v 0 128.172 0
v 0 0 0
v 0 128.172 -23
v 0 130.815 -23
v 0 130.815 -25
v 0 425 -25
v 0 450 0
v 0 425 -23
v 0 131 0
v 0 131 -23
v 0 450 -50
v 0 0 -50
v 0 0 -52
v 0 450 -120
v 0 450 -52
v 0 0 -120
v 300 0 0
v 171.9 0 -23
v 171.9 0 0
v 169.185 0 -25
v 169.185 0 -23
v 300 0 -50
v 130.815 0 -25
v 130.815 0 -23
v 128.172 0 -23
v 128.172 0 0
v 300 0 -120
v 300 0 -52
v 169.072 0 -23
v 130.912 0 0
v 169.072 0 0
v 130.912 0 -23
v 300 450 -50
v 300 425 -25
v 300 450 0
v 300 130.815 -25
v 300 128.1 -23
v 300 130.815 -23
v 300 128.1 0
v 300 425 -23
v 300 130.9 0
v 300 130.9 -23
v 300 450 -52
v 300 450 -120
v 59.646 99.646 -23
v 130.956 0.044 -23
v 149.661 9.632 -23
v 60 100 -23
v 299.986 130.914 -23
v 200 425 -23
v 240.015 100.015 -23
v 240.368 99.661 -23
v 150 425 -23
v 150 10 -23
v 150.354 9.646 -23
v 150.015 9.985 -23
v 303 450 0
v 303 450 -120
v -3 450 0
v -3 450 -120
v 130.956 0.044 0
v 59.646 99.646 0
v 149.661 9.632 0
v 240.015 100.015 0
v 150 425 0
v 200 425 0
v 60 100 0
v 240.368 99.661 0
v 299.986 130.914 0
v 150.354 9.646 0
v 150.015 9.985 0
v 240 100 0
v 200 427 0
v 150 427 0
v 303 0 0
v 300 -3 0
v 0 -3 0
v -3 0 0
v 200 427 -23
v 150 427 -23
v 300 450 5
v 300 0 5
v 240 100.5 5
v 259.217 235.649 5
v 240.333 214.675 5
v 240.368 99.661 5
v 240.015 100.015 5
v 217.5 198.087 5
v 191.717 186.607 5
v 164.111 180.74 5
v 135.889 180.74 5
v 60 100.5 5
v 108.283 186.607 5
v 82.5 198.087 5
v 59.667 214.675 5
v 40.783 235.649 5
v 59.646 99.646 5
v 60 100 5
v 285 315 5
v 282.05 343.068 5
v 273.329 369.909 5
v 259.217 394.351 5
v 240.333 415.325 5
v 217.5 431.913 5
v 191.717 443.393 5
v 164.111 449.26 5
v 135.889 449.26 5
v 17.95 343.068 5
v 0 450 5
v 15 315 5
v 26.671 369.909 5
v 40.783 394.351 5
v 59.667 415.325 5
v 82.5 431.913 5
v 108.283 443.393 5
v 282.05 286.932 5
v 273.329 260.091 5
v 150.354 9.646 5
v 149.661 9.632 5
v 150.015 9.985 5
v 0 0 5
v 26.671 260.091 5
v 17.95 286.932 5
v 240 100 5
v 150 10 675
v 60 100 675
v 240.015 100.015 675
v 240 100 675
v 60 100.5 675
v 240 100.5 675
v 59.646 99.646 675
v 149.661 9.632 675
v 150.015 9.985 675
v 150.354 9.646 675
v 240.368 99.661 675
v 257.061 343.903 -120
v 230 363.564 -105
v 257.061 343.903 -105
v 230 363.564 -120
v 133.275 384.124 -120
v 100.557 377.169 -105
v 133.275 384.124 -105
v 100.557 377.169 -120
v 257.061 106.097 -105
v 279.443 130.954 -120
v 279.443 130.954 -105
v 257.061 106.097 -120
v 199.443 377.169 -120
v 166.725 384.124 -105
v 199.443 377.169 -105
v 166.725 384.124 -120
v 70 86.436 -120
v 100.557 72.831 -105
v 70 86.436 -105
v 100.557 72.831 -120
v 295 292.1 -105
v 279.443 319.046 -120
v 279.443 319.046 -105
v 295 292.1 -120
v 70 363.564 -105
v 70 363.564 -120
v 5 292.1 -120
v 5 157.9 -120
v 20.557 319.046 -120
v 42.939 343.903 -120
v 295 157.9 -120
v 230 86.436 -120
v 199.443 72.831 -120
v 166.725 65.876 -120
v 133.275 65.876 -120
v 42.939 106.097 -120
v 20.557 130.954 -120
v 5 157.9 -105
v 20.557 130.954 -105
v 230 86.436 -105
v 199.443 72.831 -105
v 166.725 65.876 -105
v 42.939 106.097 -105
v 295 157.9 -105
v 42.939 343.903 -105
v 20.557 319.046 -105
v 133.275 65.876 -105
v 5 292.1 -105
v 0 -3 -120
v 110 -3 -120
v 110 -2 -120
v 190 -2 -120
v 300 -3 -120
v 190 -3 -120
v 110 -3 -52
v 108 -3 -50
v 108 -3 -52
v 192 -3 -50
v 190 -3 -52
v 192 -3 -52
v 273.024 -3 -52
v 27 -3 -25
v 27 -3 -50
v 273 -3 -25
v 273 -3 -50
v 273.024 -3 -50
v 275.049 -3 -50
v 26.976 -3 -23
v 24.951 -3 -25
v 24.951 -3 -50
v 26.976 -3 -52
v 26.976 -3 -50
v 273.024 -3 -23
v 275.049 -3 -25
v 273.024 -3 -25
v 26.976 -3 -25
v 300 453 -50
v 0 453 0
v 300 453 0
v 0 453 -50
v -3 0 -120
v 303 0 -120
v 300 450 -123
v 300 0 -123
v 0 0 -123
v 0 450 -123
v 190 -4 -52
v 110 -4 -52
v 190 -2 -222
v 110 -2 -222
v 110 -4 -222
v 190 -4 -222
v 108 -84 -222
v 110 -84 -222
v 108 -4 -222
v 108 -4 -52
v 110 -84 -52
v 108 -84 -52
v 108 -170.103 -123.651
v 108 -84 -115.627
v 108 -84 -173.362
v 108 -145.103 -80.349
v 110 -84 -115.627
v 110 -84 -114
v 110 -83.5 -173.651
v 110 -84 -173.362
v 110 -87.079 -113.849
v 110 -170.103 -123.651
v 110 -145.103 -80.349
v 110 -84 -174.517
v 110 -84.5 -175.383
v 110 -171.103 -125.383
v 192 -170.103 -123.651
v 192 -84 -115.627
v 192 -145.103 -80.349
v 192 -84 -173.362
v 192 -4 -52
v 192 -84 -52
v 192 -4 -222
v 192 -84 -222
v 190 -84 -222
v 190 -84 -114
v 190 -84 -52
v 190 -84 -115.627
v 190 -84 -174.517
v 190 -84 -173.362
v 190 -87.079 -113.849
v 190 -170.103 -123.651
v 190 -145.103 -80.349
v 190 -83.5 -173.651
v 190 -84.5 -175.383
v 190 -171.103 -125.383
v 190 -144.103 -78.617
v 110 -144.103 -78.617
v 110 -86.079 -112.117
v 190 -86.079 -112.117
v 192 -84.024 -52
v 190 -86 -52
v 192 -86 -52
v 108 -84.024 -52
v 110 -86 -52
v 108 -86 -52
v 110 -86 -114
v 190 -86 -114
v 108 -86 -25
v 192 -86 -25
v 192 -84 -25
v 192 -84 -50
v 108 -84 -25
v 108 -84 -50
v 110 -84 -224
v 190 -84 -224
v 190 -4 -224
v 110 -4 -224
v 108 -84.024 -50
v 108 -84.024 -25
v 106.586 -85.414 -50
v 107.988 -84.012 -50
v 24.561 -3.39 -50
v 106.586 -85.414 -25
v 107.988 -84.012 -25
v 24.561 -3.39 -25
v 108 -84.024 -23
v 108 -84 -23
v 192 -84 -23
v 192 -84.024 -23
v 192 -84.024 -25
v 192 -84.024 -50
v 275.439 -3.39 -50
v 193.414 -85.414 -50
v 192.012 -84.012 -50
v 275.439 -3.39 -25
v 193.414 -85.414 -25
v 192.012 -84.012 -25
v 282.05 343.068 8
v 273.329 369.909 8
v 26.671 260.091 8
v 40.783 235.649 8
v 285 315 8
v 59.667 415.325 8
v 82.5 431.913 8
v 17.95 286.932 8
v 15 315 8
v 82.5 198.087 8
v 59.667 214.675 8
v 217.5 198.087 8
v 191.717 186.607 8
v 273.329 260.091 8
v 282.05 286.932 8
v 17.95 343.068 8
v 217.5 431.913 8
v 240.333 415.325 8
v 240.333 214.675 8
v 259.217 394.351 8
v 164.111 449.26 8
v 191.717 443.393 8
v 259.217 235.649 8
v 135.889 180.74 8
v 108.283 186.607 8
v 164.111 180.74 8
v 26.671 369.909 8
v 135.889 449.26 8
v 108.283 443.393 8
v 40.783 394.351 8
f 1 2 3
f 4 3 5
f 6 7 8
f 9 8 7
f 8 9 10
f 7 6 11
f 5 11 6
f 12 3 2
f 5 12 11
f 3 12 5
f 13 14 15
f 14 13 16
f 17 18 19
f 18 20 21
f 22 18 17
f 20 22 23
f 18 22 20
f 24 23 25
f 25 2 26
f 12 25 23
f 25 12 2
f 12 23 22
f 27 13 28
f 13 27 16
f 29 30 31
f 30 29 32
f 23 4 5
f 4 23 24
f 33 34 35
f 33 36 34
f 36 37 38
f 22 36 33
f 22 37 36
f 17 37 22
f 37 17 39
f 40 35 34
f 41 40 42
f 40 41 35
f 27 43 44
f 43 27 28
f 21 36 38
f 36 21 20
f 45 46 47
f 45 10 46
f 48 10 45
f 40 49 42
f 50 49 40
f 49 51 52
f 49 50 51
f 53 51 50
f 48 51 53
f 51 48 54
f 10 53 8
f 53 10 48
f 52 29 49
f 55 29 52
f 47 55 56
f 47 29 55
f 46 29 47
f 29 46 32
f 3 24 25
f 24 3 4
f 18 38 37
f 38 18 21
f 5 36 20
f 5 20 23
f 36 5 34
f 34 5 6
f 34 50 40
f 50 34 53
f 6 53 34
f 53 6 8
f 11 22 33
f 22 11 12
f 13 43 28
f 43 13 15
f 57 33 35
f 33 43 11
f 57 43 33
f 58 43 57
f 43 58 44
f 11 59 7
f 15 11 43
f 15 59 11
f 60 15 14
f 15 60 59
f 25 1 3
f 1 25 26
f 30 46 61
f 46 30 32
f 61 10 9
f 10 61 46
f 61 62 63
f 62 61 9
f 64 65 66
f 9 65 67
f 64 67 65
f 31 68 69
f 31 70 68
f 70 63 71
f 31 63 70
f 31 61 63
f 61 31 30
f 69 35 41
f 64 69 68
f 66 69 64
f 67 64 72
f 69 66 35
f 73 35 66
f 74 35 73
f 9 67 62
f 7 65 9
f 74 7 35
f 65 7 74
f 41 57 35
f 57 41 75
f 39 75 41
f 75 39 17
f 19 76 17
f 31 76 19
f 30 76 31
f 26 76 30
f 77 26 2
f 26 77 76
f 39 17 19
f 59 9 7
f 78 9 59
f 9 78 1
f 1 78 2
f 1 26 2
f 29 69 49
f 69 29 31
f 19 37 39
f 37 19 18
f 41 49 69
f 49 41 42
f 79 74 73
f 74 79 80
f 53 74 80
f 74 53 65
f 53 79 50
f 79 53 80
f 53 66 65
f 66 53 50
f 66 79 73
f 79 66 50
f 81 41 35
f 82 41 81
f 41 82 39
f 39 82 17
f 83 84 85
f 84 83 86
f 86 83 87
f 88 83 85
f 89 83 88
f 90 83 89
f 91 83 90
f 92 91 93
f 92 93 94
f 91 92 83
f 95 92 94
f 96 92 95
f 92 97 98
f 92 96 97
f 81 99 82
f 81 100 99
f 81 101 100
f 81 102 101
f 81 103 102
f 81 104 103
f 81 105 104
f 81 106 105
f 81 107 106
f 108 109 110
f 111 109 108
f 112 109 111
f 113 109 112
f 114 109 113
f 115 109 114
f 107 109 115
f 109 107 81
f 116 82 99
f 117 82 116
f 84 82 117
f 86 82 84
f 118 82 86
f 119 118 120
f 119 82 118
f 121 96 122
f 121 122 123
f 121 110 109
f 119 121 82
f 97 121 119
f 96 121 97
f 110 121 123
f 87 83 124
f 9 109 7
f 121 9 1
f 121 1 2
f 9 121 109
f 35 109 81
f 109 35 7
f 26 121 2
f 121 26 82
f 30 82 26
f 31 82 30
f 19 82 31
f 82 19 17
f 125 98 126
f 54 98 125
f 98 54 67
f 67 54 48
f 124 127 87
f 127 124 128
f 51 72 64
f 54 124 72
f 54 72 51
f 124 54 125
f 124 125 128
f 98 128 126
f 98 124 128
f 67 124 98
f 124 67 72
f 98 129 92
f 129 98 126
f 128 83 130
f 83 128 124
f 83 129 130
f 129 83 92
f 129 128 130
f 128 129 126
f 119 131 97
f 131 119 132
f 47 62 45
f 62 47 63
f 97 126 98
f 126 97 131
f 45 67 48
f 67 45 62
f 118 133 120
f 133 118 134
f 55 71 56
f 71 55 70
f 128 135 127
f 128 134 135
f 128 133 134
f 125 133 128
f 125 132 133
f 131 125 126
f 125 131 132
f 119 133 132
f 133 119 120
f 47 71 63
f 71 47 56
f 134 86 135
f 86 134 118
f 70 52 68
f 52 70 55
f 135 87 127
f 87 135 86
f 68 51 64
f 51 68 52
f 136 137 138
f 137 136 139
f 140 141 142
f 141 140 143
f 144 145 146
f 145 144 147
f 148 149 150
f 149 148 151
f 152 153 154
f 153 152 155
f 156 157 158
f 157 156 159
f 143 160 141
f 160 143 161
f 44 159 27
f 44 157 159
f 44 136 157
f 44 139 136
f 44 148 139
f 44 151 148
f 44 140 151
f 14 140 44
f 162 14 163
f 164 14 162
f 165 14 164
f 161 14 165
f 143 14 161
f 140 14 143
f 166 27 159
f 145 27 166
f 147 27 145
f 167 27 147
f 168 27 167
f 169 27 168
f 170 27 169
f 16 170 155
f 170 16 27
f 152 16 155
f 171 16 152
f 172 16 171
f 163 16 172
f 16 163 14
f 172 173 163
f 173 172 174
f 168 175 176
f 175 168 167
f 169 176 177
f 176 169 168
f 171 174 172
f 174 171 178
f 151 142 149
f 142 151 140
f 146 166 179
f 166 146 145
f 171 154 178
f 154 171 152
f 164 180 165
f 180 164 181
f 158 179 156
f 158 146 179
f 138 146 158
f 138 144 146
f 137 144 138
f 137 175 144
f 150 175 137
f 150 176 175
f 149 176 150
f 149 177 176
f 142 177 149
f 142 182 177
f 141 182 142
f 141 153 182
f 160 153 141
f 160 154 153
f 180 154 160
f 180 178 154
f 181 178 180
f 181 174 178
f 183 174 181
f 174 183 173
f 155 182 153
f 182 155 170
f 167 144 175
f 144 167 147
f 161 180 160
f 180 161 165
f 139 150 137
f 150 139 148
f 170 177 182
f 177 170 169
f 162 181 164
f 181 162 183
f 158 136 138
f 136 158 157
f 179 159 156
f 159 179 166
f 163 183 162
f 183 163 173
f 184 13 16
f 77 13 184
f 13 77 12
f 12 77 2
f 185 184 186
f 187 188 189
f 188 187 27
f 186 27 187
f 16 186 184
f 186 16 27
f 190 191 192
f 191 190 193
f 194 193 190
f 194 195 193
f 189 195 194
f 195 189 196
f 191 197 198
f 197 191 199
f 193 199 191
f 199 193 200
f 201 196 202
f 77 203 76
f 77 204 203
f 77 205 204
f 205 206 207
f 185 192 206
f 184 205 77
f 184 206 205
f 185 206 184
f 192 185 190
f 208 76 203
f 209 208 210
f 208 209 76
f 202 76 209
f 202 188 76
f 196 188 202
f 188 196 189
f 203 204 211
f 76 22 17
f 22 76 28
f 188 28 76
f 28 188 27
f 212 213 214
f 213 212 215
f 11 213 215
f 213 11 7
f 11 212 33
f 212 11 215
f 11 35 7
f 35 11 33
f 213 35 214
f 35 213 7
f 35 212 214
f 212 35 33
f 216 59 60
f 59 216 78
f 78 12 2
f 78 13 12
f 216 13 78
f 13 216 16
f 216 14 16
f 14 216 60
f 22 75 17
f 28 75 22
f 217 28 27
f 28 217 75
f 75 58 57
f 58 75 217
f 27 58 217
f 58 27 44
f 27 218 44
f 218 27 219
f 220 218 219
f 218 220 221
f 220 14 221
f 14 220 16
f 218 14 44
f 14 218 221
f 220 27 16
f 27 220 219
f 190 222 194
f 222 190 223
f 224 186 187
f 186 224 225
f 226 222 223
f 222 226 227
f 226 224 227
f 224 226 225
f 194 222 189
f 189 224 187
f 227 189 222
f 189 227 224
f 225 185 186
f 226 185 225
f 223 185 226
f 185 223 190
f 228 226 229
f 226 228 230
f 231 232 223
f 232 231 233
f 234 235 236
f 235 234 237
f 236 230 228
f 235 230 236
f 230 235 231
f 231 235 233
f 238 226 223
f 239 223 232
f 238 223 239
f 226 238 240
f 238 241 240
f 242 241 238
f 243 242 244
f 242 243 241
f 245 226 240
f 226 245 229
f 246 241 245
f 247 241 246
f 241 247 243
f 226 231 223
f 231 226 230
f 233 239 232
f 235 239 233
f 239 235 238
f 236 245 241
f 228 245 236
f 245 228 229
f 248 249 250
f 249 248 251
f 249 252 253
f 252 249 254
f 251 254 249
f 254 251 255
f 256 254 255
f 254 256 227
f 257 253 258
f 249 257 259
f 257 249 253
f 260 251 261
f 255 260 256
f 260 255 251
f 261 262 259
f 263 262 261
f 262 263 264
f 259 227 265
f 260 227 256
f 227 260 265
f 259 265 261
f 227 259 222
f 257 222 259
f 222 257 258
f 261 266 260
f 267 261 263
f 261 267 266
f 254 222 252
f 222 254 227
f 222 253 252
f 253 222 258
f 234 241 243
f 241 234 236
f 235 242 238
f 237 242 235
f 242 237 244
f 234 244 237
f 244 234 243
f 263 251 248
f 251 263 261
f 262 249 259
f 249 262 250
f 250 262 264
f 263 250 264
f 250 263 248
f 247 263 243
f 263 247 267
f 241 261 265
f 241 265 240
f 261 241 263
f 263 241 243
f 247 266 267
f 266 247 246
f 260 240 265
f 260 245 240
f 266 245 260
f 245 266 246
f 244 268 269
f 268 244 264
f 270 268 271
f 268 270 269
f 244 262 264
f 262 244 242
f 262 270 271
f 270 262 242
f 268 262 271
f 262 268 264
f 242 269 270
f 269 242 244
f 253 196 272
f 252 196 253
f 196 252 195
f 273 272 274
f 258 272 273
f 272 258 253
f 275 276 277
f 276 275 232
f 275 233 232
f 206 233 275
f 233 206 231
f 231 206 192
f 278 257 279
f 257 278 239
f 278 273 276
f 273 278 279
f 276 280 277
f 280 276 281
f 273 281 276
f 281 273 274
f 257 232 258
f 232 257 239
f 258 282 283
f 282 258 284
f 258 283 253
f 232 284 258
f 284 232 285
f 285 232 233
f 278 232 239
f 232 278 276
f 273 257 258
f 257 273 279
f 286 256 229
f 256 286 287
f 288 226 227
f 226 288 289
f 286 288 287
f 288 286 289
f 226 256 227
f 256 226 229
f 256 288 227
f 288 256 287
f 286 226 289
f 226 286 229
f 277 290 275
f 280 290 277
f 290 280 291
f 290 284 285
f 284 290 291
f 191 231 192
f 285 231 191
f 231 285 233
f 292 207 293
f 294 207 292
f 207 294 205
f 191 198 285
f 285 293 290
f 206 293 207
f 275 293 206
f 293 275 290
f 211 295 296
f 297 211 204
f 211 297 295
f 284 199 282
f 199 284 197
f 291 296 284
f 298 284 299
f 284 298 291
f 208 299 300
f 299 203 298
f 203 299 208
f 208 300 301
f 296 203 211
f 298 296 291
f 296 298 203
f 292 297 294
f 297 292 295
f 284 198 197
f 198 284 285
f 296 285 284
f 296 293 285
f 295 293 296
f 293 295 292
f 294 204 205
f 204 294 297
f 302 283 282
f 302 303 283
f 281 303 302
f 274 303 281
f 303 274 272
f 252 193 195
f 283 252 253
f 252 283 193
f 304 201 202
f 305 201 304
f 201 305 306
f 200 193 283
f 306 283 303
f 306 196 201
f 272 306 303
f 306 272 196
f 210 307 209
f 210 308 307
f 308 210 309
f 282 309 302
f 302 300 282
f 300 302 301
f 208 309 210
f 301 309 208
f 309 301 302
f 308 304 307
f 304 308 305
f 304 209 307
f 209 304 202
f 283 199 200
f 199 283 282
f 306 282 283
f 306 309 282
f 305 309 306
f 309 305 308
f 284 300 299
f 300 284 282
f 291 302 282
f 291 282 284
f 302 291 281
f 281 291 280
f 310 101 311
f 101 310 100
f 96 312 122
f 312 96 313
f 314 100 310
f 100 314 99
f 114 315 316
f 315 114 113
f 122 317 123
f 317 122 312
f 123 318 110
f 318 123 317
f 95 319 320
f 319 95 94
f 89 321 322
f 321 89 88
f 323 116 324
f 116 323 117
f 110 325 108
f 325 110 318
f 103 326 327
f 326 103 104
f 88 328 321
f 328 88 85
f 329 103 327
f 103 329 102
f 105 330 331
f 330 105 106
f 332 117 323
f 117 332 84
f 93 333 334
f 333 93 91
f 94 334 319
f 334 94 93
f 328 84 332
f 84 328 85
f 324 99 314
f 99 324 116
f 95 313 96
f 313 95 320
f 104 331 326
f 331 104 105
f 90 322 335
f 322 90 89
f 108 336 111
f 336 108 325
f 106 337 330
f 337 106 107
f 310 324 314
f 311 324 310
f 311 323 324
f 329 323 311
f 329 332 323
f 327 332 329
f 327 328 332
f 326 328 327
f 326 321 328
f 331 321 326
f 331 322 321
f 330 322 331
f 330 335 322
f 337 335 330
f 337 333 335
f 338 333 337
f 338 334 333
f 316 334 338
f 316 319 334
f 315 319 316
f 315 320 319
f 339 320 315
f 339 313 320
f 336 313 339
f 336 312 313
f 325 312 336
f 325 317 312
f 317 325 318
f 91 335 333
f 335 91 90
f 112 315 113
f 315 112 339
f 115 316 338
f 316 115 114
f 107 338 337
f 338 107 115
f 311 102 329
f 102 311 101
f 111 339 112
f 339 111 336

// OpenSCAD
stove_width=300;
stove_length=450;
oven_height=70;

intake_area=6500;//(stove_width/3)^2;
echo (str("Recomended intake area ",intake_area,"mm^2"));
fullWidth_intake_gap=25;//intake_area/stove_width; = 33.33
echo (str("ideal intake gap ",intake_area/stove_width,"mm"));
echo (str("actual intake gap ",fullWidth_intake_gap,"mm"));
echo (str("actual intake area through stove ",fullWidth_intake_gap*stove_width,"mm"));

outerside_height = fullWidth_intake_gap*2+oven_height;

color([.6,.6,.6])
innerBaffles();
topPlate();

//color([.1,.8,.1])
//translate([stove_width/2,+13.5,0])
//fuelBasket();

color([.1,.1,.6])
flu();

largePan();

pizzaStone();

color([.1,.1,.8],.3)
outerBox();

translate([stove_width/2,-44,-fullWidth_intake_gap])
rotate([0,-90,270])
fireBox();

module fireBox() {
    fireboxHeight = 170;
    fireboxWidth = 80;
    
    
    translate([-fireboxHeight-fullWidth_intake_gap-2,0,0])
    fireboxOuter(fireboxHeight, fireboxWidth);

    for (i = [0:1:1])
    mirror([0,i,0]) {
        translate([-fullWidth_intake_gap-2,-fireboxWidth/2-2,fireboxWidth/2 +2])
        rotate([45+180,0,0])
        rotate([0,90,0])
        triangle_panel_2mm(fireboxWidth/2+18,"exhaustManifold");

        translate([0,-fireboxWidth/2-2,fireboxWidth/2 +2])
        rotate([45+180,0,0])
        rotate([0,90,0])
        triangle_panel_2mm(fireboxWidth/2+18,"exhaustManifold");
        
        translate([-fullWidth_intake_gap,-fireboxWidth/2-2,-fireboxWidth/2])
        rotate([45+90,0,0])
        panel_2mm([fullWidth_intake_gap,116], "Firebox fuel - exhaust manifold");
    }

    translate([0,-fireboxWidth/2-2,fireboxWidth/2+2])
    rotate([0,90,0])
    panel_2mm([fireboxWidth+2,fireboxWidth+4], "Firebox fuel - exhaust manifold top");

    translate([0,-fireboxWidth/2-2,-fireboxWidth/2])
    rotate([0,180,0])
    panel_2mm([fullWidth_intake_gap+2,fireboxWidth+4], "Firebox fuel - exhaust manifold back");
}

module fireboxOuter(fireboxHeight, fireboxWidth) {
    feedLength = 100;
    fireboxFuelIntakeHeight = 50;
    
    echo (str("Firebox chimney area ",fireboxWidth*fireboxWidth,"mm^2"));
    echo (str("Firebox intake area ",fireboxFuelIntakeHeight*fireboxWidth,"mm^2"));

    for (i = [0,1,3]) {
        rotate([i*90,0,0])
        translate([0,-fireboxWidth/2,fireboxWidth/2])
        panel_2mm([fireboxHeight, fireboxWidth], "Firebox side - Outer");
    }

    translate([70,0,-27])
    rotate([0,60,0]) {
        
        for (i = [1:2:4]) {
            rotate([i*90,0,0])
            translate([0,-fireboxFuelIntakeHeight/2,fireboxWidth/2])
            panel_2mm([feedLength, fireboxFuelIntakeHeight], "Firebox fuel - Feed Outer left/right");
        }

        translate([0,-fireboxWidth/2,-fireboxFuelIntakeHeight/2-2])
        panel_2mm([feedLength, fireboxWidth], "Firebox fuel - Feed Outer bottom");

        translate([33,-fireboxWidth/2,fireboxFuelIntakeHeight/2])
        panel_2mm([feedLength-33, fireboxWidth], "Firebox fuel - Feed Outer top");
    }
    
    translate([fireboxHeight,-fireboxWidth/2,-fireboxWidth/2])
    rotate([0,180,0])
    panel_2mm([fireboxHeight-108,fireboxWidth], "Firebox fuel - Top back");
    
    translate([0,-fireboxWidth/2,-fireboxWidth/2])
    rotate([0,-90,0])
    panel_2mm([fireboxWidth, fireboxWidth], "Firebox side - bottom");

}

module largePan() {
    panSize = 270;
    color([.9,.9,.8])
    translate([stove_width/2,stove_length - panSize/2])
    linear_extrude(8)
    circle(d=panSize);
}

module pizzaStone() {
    pizzaStone = 320;
    color([.9,.88,.8])
    translate([stove_width/2,stove_length/2,-(outerside_height)])
    difference() {
        linear_extrude(15)
        circle(d=pizzaStone);
        
        translate([290/2,-pizzaStone/2,-1])
        cube([40,pizzaStone,17]);

        rotate([0,0,180])
        translate([290/2,-pizzaStone/2,-1])
        cube([40,pizzaStone,17]);
    }
}

module fuelBasket() {
    fluHoleHeight = (stove_width/3)-10.5 -5.5;
    basket_sideLength = 119;
    panelWidth = 2;

    echo(str("Fuel Basket Intake: ",fluHoleHeight^2,"mm^2"));

    //bottom plate
    translate([0,-9.6,+5])
    difference() {
        triangle_panel_2mm(fluHoleHeight+16, "FuelBasket - Top retainer");
        translate([0,6.7,-1])
        linear_extrude(5)
        triangle(fluHoleHeight+4.9);
    }
    
    //long side of triangle top section
    translate([-fluHoleHeight,fluHoleHeight+panelWidth,0])
    rotate([90,0,0])
    panel_2mm([fluHoleHeight*2, fullWidth_intake_gap], "FuelBasket - Top, long side");

    //left and right sides of top section
    translate([-fluHoleHeight,fluHoleHeight,0])
    rotate([90,0,-45])
    panel_2mm([basket_sideLength, fullWidth_intake_gap], "FuelBasket - Top, short side");

    rotate([90,0,45])
    panel_2mm([basket_sideLength, fullWidth_intake_gap], "FuelBasket - Top, short side");


    //bottom plate
    translate([0,0,-fullWidth_intake_gap+panelWidth])
    triangle_panel_2mm(fluHoleHeight, "FuelBasket - Bottom Plate");


    //Mesh section
    //long side of triangle
    translate([-fluHoleHeight,fluHoleHeight+0.5,-fullWidth_intake_gap+panelWidth])
    rotate([90,0,0])
    panel_0_5mm_mesh([fluHoleHeight*2, fullWidth_intake_gap], "FuelBasket - Mesh, long side");

    //left and right sides
    translate([-fluHoleHeight,fluHoleHeight,-fullWidth_intake_gap+panelWidth])
    rotate([90,0,-45])
    panel_0_5mm_mesh([basket_sideLength, fullWidth_intake_gap], "FuelBasket - Mesh, short side");

    translate([0,0,-fullWidth_intake_gap+panelWidth])
    rotate([90,0,45])
    panel_0_5mm_mesh([basket_sideLength, fullWidth_intake_gap], "FuelBasket - Mesh, short side");
}

module flu() {
    fluHoleHeight = (stove_width/3)-10;
    flueSideWidth = 127.3;
    fluHeight = 700;

    translate([stove_width/2,10,-fullWidth_intake_gap])
    union() {
        translate([-fluHoleHeight,fluHoleHeight+0.5,fullWidth_intake_gap])
        rotate([90,0,0])
        panel_0_5mm([fluHoleHeight*2, fluHeight-fullWidth_intake_gap], "Flu Pipe - longside");

        //left and right sides of top section
        translate([-fluHoleHeight,fluHoleHeight,0])
        rotate([90,0,-45])
        panel_0_5mm([flueSideWidth, fluHeight], "Flu Pipe");

        translate([0,0,0])
        rotate([90,0,45])
        panel_0_5mm([flueSideWidth, fluHeight], "Flu Pipe");
    }
    
    echo(str("Flue outer area: ",fluHoleHeight^2,"mm^2"));
}


module intake_hole() {
    intakeHoleSize = (stove_width/3) -10;
    
    translate([stove_width/2,+10,-.5])
    linear_extrude(6)
    triangle(intakeHoleSize);
    
    
    echo(str("Intake: ",intakeHoleSize^2,"mm^2"));
}


module topPlate(){
    difference(){
        panel_5mm([stove_width, stove_length], "Top plate");

        intake_hole();
    }
}

module innerBaffles() {
    baffle_thickness = 2;
    sideBaffleWidth = 2*stove_width/3-14.8;
    
    translate([0,0,-fullWidth_intake_gap])
    difference(){

        panel_2mm([stove_width, stove_length-fullWidth_intake_gap], "Inner Baffle, Upper Plate");
        fluCutout();
    }

    translate([0,0,-(fullWidth_intake_gap*2+baffle_thickness)])
    panel_2mm([stove_width, stove_length], "Inner Baffle, lower Plate");

    translate([0,              stove_width/2-20+2-baffle_thickness/2,-fullWidth_intake_gap+baffle_thickness])
    rotate([90,0,-45])
    panel_2mm([sideBaffleWidth, fullWidth_intake_gap-baffle_thickness], "Inner Baffle, edges");

    translate([stove_width+1.4,stove_width/2-19.5-baffle_thickness/2,-fullWidth_intake_gap+baffle_thickness])
    rotate([90,0,45+180])
    panel_2mm([sideBaffleWidth, fullWidth_intake_gap-baffle_thickness], "Inner Baffle, edges");
    
    //small inner baffle for center
    translate([(stove_width/3*2)-50,stove_length-fullWidth_intake_gap,0])
    rotate([-90,0,0])
    panel_2mm([50, fullWidth_intake_gap-baffle_thickness], "Inner Baffle, vertical");
}

module outerBox(){
    //Ends
    translate([0,-3,0])
    rotate([-90,0,0])
    panel_3mm([stove_width, outerside_height], "Outer Box End");
    
    translate([0,stove_length,0])
    rotate([-90,0,0])
    panel_3mm([stove_width, fullWidth_intake_gap*2], "Outer Box End");

    //Sides
    rotate([-90,0,90])
    panel_3mm([stove_length, outerside_height], "Outer Box Side");

    translate([stove_width+3,0,0])
    rotate([-90,0,90])
    panel_3mm([stove_length, outerside_height], "Outer Box Side");

    //bottom
    translate([0,0,-(outerside_height+3)])
    panel_3mm([stove_width, stove_length], "Outer Box Bottom");
}


module fluCutout() {
    fluCutout_near();
    fluCutout_far();
}

module fluCutout_near() {
    fluHoleHeight = (stove_width/3)-10+2.5;

    translate([0,0,-0.5])
    rotate([0,0,-45])
    linear_extrude(6)
    triangle(fluHoleHeight);
}

module fluCutout_far() {
    fluHoleHeight = (stove_width/3)-10+2.5;
    
    translate([stove_width,0,-0.5])
    rotate([0,0,45])
    linear_extrude(6)
    triangle(fluHoleHeight);
    
    echo(str("Flu cutout size ",(fluHoleHeight^2)));
}

module triangle(height) {
    longEdge = 2*height;

    polygon([[0,0],[-longEdge/2,height],[longEdge/2,height],[0,0]]);
}

module panel_5mm(dims, name="") {
    cube([dims[0],dims[1], 5]);
    echo(str("Part 5mm sheet ", dims[0], "x", dims[1]," - ",name));
}

module panel_2mm(dims, name="") {
    cube([dims[0],dims[1], 2]);
    echo(str("Part 2mm sheet ", dims[0], "x", dims[1]," - ",name));
}

module panel_3mm(dims, name="") {
    cube([dims[0],dims[1], 3]);
    echo(str("Part 3mm sheet ", dims[0], "x", dims[1]," - ",name));
}

module panel_0_5mm(dims, name="") {
    cube([dims[0],dims[1], 0.5]);
    echo(str("Part 0.5mm sheet ", dims[0], "x", dims[1]," - ",name));
}

module panel_0_5mm_mesh(dims, name="") {
    wireThickness = 0.4;
    seperation = 5;
    
    for(x = [0 : seperation : dims[0]]) {
        translate([x,0,0])
        cube([wireThickness,dims[1], wireThickness]);
    }
    for(y = [0 : seperation : dims[1]]) {
        translate([0,y,0])
        cube([dims[0],wireThickness, wireThickness]);
    }
    echo(str("Part 0.5mm sheet ", dims[0], "x", dims[1]," - ",name));
}

module triangle_panel_3mm(height, name="") {
    linear_extrude(3)
    triangle(height);
    echo(str("triangle panel 3mm sheet height=", height," - ",name));
}

module triangle_panel_2mm(height, name="") {
    linear_extrude(2)
    triangle(height);
    echo(str("triangle panel 2mm sheet height=", height," - ",name));
}
